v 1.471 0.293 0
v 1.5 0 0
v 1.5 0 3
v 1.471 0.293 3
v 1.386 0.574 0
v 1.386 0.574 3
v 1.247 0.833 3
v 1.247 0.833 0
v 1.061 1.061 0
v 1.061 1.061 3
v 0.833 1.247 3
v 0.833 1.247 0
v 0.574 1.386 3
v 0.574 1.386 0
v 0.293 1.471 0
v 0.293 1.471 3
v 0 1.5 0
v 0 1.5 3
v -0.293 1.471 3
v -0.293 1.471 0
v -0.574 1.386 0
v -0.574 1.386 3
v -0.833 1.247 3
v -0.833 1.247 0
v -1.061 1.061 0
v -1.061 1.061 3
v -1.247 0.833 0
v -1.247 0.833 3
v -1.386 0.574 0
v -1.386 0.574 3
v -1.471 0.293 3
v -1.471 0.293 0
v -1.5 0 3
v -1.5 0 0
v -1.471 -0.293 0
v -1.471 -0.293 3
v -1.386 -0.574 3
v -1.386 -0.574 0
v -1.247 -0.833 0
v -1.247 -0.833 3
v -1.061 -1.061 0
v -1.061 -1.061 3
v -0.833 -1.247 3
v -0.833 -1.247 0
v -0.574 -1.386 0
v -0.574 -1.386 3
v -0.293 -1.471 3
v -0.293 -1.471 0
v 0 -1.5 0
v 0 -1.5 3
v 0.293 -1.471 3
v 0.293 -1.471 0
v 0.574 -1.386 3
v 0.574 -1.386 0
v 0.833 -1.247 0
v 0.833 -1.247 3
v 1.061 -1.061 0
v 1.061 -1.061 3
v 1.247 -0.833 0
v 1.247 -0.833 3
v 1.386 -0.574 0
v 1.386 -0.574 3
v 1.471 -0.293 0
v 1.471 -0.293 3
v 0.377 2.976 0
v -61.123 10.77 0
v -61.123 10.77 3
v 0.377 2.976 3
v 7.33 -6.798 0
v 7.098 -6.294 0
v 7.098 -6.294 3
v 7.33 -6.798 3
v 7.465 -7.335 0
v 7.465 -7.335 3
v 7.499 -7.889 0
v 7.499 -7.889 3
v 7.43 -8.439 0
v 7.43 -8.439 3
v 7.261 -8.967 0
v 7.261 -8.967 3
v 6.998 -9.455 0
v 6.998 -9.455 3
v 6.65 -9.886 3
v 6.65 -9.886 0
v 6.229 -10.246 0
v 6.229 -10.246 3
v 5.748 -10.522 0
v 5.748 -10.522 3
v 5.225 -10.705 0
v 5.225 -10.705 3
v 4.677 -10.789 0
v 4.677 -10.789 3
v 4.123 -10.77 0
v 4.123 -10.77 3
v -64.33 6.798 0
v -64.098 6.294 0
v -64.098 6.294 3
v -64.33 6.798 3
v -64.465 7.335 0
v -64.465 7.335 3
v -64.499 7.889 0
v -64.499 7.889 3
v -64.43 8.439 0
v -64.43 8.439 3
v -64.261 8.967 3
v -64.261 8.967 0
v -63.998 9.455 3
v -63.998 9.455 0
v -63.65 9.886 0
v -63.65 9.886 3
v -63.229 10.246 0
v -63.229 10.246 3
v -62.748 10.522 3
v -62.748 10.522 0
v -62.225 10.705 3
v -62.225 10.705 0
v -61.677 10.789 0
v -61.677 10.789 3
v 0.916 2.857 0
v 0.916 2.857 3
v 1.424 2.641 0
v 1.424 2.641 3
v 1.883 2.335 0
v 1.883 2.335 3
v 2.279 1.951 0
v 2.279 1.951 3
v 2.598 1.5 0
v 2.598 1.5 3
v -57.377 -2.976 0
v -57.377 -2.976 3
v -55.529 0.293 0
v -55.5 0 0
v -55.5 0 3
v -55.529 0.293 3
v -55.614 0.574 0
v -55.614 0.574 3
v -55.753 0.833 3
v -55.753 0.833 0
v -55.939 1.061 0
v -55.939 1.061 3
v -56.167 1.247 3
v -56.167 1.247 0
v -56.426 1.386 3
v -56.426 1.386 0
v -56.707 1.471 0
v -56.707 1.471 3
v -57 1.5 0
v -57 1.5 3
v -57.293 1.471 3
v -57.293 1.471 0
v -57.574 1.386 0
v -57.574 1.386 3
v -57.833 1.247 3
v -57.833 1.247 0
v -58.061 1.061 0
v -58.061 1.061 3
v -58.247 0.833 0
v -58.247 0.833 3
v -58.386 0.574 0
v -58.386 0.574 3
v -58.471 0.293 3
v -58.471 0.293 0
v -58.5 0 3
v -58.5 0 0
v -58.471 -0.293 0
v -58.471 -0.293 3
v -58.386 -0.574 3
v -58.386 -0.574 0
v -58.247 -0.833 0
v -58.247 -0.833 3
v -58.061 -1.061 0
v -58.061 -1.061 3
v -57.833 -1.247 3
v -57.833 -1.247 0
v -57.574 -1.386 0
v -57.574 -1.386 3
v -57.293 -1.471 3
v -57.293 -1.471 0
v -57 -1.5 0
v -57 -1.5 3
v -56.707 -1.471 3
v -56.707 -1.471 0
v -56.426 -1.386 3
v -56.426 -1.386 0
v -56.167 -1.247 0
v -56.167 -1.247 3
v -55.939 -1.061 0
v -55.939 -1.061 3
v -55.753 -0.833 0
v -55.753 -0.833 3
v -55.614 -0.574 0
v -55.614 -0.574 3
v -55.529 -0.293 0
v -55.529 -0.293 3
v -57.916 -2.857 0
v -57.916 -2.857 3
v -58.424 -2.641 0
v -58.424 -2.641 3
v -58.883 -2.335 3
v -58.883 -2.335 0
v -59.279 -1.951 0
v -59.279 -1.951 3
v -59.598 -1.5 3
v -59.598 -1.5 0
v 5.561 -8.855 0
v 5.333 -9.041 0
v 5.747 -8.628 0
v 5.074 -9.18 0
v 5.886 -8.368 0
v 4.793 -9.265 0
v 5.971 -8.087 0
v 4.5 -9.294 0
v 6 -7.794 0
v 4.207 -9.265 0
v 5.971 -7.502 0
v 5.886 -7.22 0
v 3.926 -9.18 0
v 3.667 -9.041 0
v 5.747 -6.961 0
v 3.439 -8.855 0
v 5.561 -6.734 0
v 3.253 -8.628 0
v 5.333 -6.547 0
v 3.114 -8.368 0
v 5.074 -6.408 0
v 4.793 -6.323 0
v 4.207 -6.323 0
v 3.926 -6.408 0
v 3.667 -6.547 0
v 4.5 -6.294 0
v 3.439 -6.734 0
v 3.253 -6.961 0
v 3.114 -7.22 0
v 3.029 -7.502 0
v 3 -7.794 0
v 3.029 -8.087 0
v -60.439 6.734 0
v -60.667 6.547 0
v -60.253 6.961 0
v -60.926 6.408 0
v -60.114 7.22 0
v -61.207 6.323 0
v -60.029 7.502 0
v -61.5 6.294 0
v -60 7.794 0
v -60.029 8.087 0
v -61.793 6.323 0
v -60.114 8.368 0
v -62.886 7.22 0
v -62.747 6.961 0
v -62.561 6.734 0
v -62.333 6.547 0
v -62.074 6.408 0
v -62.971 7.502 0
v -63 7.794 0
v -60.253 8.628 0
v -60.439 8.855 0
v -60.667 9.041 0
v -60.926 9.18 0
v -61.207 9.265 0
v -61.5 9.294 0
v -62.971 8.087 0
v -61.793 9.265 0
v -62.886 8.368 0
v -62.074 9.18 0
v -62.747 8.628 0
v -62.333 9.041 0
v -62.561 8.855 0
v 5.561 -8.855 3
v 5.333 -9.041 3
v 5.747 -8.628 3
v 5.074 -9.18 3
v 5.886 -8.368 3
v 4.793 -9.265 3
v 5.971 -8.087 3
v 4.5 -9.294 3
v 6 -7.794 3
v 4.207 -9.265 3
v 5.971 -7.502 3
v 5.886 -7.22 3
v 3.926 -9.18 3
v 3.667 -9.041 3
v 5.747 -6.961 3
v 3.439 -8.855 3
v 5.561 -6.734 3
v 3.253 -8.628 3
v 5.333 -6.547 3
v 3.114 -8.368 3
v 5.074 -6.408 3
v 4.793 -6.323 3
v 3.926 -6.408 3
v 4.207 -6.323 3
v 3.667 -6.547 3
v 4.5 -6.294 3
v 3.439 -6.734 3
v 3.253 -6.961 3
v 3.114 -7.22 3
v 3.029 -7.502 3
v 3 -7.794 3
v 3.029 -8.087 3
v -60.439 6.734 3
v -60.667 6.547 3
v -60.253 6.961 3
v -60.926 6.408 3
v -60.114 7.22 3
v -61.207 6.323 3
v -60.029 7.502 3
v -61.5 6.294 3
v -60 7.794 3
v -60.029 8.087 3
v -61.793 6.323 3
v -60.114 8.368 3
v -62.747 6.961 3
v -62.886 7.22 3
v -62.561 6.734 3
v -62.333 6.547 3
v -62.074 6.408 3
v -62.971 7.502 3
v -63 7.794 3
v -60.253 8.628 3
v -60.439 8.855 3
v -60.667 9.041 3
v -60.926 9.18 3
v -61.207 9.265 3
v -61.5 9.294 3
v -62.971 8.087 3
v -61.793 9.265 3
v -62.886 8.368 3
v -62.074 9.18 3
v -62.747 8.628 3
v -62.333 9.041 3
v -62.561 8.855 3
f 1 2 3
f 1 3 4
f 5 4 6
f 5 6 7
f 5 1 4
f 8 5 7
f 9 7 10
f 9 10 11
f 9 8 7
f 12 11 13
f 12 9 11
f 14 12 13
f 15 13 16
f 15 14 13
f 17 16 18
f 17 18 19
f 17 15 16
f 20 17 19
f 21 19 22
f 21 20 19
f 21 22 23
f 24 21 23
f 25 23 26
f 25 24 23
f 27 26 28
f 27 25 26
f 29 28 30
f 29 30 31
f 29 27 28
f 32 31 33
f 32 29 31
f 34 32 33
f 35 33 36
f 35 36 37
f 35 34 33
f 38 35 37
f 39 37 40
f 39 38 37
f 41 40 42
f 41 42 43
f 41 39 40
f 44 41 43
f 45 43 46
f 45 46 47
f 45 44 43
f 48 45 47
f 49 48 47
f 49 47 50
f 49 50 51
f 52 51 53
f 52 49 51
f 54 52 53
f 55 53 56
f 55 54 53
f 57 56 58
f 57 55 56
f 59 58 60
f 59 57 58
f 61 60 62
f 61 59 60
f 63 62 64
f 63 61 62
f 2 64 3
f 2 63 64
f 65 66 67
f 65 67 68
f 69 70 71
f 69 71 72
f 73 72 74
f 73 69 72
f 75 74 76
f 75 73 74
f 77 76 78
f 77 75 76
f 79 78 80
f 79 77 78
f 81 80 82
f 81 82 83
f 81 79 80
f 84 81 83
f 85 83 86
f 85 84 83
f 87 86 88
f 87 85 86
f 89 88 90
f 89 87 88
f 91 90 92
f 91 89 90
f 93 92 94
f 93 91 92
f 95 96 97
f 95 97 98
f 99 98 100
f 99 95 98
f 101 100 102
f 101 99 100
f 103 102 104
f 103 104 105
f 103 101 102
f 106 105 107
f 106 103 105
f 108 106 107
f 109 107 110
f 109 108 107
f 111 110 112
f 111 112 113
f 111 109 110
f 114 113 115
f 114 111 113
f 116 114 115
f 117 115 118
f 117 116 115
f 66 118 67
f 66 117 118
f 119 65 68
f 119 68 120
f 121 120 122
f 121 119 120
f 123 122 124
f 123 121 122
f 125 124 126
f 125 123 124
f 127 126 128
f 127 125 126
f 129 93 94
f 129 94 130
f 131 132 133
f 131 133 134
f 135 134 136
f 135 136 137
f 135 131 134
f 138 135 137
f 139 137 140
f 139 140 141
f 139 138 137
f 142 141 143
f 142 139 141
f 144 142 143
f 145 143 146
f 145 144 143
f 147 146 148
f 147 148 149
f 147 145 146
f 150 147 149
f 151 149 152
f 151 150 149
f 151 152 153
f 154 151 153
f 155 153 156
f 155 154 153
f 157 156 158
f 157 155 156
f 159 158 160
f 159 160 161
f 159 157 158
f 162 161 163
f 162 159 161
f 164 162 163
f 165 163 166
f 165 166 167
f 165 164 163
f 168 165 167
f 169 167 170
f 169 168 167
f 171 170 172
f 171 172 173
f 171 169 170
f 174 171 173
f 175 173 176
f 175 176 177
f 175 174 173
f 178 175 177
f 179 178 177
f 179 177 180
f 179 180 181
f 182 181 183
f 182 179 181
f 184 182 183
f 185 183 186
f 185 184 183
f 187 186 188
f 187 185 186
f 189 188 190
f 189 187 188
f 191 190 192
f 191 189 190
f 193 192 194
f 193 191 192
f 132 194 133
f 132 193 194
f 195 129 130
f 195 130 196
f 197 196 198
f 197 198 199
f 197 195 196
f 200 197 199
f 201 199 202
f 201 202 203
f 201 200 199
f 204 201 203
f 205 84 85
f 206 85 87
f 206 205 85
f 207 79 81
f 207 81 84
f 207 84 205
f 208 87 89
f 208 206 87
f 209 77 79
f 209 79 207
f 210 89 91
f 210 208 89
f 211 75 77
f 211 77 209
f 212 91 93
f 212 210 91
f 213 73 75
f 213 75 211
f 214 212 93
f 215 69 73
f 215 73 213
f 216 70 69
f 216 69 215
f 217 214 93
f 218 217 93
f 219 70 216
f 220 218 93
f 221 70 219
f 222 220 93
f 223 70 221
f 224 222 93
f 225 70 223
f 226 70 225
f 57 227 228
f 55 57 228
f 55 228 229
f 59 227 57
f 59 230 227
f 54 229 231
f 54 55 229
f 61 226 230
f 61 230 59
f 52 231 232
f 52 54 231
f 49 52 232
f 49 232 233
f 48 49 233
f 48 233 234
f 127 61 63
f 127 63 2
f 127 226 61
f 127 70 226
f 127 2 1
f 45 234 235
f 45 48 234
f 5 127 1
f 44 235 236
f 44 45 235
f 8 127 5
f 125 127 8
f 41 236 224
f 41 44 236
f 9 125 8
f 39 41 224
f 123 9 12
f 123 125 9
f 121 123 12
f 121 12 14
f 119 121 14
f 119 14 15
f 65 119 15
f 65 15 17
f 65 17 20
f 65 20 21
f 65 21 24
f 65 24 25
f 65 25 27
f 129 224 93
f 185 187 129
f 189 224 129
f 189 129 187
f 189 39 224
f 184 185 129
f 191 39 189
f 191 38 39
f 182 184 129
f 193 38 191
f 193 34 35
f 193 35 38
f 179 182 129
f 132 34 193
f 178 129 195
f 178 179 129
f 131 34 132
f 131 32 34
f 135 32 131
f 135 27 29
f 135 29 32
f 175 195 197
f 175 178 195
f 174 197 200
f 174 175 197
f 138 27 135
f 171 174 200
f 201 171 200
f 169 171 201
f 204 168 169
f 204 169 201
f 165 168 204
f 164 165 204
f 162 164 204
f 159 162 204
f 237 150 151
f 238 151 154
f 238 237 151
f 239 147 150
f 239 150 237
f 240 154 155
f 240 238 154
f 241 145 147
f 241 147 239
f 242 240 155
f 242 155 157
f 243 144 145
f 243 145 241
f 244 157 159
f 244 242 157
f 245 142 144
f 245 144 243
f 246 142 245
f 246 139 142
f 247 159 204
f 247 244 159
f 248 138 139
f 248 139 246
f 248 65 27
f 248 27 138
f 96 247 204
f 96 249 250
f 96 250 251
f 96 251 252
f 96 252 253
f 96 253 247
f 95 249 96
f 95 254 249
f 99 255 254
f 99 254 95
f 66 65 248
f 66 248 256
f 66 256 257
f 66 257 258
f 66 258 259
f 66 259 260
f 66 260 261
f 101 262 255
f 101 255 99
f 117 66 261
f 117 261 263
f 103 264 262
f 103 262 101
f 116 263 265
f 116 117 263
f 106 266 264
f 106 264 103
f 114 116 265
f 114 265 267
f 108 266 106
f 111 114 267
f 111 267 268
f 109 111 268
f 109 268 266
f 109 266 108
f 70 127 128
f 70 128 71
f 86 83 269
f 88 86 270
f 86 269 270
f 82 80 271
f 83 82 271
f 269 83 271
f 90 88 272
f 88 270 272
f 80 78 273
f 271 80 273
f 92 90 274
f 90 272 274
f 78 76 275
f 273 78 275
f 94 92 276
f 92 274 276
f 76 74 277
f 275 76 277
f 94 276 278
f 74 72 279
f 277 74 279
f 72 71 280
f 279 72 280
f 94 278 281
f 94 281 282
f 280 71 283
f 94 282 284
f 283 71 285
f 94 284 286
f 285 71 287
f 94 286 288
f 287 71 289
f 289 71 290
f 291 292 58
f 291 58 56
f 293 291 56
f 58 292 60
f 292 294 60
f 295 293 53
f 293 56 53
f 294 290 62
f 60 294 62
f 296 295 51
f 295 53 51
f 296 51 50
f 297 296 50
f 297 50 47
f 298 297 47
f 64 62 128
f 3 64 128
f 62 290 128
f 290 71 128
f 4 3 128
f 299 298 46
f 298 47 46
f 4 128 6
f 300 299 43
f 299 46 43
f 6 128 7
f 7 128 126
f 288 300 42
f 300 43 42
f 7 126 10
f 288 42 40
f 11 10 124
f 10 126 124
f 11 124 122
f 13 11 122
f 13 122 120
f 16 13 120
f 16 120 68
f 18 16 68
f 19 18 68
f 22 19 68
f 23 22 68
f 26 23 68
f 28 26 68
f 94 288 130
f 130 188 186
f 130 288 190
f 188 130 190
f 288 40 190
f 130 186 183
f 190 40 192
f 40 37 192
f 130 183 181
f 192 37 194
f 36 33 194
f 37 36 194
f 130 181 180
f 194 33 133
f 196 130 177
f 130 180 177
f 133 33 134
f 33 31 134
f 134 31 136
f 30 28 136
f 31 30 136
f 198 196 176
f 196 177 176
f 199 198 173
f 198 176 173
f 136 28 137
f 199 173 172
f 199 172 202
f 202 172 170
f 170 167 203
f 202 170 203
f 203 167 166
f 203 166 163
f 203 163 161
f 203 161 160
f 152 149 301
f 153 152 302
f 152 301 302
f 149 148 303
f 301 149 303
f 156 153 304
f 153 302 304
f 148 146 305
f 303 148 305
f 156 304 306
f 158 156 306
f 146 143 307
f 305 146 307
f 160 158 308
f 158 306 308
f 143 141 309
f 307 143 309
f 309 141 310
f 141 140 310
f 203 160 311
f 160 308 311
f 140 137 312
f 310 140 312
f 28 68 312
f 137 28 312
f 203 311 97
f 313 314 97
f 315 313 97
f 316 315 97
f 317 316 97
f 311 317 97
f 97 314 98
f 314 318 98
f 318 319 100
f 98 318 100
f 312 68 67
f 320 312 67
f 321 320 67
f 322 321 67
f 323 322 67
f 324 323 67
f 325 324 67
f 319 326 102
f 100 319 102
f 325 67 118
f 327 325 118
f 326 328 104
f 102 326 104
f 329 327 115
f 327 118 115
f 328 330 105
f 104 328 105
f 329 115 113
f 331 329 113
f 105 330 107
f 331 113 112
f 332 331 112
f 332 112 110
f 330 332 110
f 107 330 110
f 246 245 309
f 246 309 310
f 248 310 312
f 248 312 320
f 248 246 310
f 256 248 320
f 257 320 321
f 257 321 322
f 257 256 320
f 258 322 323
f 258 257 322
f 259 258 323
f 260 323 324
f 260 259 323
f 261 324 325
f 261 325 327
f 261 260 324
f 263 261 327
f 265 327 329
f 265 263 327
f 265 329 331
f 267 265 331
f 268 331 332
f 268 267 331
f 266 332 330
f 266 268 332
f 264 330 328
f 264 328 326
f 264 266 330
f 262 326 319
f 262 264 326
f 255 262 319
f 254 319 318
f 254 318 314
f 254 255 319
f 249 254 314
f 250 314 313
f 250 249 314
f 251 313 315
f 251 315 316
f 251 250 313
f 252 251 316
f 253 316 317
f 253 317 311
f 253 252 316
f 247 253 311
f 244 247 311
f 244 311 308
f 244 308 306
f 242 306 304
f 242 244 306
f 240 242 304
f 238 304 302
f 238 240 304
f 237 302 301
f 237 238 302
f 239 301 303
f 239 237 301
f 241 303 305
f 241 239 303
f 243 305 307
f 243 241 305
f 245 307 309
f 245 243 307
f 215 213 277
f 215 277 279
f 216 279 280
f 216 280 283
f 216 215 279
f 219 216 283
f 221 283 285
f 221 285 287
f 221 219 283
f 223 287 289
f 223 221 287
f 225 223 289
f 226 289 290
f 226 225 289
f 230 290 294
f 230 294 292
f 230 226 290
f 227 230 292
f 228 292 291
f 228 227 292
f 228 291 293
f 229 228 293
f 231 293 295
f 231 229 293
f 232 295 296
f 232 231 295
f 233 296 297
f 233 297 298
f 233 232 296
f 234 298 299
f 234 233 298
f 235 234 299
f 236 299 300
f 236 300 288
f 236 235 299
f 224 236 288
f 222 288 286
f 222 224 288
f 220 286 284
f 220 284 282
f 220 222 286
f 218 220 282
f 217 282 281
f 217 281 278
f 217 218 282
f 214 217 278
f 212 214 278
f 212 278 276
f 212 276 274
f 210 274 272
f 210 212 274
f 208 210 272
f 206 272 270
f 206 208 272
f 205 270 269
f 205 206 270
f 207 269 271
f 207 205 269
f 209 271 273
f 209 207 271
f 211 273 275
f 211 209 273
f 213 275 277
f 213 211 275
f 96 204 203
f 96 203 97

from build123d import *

# Parameters (mm, degrees)
SKETCH2_R           = 1.5
BOSS_EXTRUDE1_DEPTH = 3


with BuildPart() as part:
    # Sketch2 → Boss-Extrude1 (new body)
    with BuildSketch(Plane.XY):
        with BuildLine():
            Line((-61.12281084, 10.770422233), (0.37718916, 2.976193599))
            ThreePointArc((0.37718916, 2.976193599), (1.660673927, 2.49843193), (2.598076211, 1.5))
            Line((2.598076211, 1.5), (7.098076211, -6.294228634))
            ThreePointArc((7.098076211, -6.294228634), (6.99843193, -9.454902562), (4.12281084, -10.770422233))
            Line((4.12281084, -10.770422233), (-57.37718916, -2.976193599))
            ThreePointArc((-57.37718916, -2.976193599), (-58.660673927, -2.49843193), (-59.598076211, -1.5))
            Line((-59.598076211, -1.5), (-64.098076211, 6.294228634))
            ThreePointArc((-64.098076211, 6.294228634), (-63.99843193, 9.454902562), (-61.12281084, 10.770422233))
        make_face()
        with Locations((-57, 0)):
            Circle(SKETCH2_R, mode=Mode.SUBTRACT)
        with Locations((-61.5, 7.794228634)):
            Circle(SKETCH2_R, mode=Mode.SUBTRACT)
        Circle(SKETCH2_R, mode=Mode.SUBTRACT)
        with Locations((4.5, -7.794228634)):
            Circle(SKETCH2_R, mode=Mode.SUBTRACT)
    extrude(amount=BOSS_EXTRUDE1_DEPTH)


solid = part.part
